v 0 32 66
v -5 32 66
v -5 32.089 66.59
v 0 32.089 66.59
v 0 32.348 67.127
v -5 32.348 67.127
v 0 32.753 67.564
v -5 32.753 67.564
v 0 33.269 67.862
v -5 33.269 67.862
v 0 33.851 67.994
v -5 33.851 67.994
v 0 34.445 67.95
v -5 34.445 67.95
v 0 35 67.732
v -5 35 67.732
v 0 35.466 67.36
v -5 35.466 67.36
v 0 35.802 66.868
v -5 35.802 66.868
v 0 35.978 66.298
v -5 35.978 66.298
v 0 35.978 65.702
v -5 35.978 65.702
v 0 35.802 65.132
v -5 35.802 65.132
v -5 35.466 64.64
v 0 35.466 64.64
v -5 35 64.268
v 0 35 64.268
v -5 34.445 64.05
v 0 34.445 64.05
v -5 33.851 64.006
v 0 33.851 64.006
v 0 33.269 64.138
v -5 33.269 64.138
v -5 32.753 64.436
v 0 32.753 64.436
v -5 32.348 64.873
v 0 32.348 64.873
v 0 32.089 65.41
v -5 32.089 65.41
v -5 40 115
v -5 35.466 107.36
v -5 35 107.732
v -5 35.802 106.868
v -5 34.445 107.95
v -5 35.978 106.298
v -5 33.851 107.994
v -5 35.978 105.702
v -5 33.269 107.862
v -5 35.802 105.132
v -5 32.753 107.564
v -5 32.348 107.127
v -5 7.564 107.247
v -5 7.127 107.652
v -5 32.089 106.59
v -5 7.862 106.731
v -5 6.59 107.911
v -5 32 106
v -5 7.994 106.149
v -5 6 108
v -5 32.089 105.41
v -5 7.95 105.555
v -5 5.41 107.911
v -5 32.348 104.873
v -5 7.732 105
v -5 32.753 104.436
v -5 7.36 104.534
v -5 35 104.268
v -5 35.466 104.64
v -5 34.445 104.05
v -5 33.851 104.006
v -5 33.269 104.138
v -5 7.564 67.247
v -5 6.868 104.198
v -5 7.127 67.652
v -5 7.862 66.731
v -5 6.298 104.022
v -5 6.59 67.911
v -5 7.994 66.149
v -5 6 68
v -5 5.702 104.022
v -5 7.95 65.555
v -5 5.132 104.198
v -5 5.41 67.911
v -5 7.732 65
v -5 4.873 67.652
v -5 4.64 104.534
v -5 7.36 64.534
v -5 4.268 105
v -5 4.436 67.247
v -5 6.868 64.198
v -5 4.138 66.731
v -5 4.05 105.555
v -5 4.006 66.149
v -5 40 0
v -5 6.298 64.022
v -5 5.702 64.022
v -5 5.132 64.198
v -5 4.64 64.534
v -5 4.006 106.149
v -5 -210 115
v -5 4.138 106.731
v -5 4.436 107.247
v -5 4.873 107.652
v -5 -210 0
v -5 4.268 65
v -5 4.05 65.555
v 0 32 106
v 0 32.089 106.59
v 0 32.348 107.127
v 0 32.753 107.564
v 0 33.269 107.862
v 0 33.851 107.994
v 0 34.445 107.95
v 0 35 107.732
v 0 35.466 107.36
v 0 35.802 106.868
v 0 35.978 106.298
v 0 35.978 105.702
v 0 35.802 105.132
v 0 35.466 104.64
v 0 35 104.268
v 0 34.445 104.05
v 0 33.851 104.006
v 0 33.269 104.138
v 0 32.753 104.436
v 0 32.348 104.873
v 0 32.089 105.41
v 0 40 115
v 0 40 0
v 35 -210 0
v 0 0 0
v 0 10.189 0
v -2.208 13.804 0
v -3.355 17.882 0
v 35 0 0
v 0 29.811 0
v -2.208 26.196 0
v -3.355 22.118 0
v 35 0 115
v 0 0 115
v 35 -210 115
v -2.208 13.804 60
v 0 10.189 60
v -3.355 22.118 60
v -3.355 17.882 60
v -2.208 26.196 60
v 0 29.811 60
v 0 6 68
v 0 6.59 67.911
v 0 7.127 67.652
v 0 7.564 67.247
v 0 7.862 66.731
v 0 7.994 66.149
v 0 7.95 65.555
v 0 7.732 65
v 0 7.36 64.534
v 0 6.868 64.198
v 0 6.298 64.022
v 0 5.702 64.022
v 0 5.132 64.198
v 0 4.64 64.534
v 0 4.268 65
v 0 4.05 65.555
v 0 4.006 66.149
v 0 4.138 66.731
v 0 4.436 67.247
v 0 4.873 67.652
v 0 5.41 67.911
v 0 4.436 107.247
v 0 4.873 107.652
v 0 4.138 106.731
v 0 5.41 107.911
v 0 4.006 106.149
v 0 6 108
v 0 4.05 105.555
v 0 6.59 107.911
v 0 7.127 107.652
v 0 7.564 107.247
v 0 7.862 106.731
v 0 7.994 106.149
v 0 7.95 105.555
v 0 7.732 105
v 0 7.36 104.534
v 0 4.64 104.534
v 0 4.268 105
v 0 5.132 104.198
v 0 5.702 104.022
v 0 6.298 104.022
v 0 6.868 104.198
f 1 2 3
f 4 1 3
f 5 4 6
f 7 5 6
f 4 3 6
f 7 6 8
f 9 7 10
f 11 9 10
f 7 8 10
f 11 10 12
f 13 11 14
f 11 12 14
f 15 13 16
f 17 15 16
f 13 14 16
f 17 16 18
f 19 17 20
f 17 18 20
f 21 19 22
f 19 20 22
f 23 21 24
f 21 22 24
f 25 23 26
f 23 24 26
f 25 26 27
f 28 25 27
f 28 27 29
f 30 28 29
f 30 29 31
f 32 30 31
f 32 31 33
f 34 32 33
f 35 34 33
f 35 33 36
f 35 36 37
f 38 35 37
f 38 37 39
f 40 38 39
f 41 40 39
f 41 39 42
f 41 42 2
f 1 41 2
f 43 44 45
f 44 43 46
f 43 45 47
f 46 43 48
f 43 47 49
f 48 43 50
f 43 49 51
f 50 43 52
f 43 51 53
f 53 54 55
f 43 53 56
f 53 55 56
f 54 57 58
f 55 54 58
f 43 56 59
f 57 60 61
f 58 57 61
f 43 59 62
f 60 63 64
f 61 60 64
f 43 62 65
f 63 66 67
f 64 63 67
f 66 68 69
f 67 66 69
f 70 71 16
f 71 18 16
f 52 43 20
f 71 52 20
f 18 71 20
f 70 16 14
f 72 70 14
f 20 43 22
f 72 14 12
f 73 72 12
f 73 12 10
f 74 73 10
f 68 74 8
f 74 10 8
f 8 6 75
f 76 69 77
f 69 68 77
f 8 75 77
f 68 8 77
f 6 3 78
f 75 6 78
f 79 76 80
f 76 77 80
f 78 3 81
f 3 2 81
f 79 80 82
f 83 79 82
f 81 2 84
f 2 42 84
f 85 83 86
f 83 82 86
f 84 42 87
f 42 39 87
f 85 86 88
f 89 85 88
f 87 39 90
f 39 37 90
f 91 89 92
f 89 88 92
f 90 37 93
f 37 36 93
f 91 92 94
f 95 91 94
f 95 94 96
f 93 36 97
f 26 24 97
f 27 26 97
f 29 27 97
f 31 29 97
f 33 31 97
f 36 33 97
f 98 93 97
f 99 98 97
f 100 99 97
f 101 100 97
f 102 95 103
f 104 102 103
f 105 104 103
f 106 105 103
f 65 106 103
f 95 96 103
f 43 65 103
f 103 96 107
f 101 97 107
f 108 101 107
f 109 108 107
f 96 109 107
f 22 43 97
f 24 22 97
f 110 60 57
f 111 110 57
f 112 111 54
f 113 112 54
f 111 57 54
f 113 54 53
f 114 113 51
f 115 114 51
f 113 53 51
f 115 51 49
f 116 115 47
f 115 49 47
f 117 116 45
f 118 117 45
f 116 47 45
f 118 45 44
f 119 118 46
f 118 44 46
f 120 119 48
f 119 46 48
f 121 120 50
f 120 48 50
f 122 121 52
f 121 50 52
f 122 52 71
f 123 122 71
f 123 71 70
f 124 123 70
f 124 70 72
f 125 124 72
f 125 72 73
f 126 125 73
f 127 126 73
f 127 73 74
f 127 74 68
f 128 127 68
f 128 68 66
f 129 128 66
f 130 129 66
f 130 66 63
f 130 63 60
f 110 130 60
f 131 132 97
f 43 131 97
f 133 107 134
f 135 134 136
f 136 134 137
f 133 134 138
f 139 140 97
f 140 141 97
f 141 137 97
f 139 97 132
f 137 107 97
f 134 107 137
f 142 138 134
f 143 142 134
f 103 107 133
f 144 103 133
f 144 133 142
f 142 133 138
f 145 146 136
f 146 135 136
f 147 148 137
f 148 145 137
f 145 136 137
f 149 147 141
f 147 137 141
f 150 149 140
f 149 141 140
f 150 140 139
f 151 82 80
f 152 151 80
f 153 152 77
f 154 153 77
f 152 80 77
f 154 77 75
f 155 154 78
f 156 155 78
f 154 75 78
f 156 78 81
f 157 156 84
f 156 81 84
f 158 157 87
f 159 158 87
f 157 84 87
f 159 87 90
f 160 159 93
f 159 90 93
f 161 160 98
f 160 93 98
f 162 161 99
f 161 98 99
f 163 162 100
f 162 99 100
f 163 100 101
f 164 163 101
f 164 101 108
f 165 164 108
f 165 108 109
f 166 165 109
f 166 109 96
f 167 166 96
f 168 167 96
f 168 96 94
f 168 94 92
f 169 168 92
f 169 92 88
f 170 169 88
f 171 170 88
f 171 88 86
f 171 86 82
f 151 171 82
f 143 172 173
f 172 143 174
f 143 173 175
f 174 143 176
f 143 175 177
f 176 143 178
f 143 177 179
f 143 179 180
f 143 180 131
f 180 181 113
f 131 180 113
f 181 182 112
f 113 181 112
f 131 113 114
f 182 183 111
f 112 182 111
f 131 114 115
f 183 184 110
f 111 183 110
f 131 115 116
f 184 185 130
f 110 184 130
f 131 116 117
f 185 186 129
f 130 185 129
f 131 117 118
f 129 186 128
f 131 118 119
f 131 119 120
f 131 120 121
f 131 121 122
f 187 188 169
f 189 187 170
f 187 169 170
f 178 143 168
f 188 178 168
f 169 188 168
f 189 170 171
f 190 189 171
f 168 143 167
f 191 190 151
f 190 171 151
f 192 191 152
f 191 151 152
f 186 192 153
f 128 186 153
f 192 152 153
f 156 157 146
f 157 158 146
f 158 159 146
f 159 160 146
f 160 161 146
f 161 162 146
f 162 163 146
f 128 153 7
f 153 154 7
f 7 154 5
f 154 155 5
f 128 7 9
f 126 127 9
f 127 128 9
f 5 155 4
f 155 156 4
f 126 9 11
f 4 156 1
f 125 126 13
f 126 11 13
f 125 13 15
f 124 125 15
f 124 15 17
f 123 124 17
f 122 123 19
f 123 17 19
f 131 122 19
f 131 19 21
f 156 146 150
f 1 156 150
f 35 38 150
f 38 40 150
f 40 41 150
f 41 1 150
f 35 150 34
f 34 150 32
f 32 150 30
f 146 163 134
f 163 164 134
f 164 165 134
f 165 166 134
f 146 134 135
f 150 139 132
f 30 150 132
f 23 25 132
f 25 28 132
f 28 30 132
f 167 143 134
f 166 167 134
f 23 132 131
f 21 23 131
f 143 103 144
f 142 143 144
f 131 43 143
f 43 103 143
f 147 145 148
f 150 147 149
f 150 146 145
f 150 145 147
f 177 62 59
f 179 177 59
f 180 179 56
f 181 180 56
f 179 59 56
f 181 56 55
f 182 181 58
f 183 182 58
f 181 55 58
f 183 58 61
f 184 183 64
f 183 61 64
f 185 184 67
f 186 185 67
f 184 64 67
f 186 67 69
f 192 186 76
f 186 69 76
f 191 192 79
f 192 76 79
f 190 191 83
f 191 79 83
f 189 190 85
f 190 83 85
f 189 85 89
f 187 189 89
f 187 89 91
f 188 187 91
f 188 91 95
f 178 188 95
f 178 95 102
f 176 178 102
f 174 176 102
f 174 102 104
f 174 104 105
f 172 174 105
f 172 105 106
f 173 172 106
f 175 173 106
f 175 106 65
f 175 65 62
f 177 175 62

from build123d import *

# Parameters (mm, degrees)
BOSS_EXTRUDE1_DEPTH = 115
SKETCH2_R           = 2
CUT_EXTRUDE1_DEPTH  = 243.744721879
SKETCH3_R           = 15.5
CUT_EXTRUDE2_DEPTH  = 60


with BuildPart() as part:
    # Sketch1 → Boss-Extrude1 (new body)
    with BuildSketch(Plane.XY):
        Polygon((0, 0), (0, 40), (-5, 40), (-5, -210), (35, -210), (35, 0), align=None)
    extrude(amount=BOSS_EXTRUDE1_DEPTH)

    # Sketch2 → Cut-Extrude1 (cut, through all)
    with BuildSketch(Plane.ZY.offset(5)):
        with Locations(Location((106, 34, 0), (0, 0, 270))):
            Circle(SKETCH2_R)
        with Locations(Location((66, 34, 0), (0, 0, 270))):
            Circle(SKETCH2_R)
        with Locations((66, 6)):
            Circle(SKETCH2_R)
        with Locations((106, 6)):
            Circle(SKETCH2_R)
    extrude(amount=-CUT_EXTRUDE1_DEPTH, mode=Mode.SUBTRACT)

    # Sketch3 → Cut-Extrude2 (cut)
    with BuildSketch(Plane(origin=(0, 0, 0), x_dir=(-1, 0, 0), z_dir=(0, 0, -1))):
        with Locations((-12, 20)):
            Circle(SKETCH3_R)
    extrude(amount=-CUT_EXTRUDE2_DEPTH, mode=Mode.SUBTRACT)


solid = part.part
